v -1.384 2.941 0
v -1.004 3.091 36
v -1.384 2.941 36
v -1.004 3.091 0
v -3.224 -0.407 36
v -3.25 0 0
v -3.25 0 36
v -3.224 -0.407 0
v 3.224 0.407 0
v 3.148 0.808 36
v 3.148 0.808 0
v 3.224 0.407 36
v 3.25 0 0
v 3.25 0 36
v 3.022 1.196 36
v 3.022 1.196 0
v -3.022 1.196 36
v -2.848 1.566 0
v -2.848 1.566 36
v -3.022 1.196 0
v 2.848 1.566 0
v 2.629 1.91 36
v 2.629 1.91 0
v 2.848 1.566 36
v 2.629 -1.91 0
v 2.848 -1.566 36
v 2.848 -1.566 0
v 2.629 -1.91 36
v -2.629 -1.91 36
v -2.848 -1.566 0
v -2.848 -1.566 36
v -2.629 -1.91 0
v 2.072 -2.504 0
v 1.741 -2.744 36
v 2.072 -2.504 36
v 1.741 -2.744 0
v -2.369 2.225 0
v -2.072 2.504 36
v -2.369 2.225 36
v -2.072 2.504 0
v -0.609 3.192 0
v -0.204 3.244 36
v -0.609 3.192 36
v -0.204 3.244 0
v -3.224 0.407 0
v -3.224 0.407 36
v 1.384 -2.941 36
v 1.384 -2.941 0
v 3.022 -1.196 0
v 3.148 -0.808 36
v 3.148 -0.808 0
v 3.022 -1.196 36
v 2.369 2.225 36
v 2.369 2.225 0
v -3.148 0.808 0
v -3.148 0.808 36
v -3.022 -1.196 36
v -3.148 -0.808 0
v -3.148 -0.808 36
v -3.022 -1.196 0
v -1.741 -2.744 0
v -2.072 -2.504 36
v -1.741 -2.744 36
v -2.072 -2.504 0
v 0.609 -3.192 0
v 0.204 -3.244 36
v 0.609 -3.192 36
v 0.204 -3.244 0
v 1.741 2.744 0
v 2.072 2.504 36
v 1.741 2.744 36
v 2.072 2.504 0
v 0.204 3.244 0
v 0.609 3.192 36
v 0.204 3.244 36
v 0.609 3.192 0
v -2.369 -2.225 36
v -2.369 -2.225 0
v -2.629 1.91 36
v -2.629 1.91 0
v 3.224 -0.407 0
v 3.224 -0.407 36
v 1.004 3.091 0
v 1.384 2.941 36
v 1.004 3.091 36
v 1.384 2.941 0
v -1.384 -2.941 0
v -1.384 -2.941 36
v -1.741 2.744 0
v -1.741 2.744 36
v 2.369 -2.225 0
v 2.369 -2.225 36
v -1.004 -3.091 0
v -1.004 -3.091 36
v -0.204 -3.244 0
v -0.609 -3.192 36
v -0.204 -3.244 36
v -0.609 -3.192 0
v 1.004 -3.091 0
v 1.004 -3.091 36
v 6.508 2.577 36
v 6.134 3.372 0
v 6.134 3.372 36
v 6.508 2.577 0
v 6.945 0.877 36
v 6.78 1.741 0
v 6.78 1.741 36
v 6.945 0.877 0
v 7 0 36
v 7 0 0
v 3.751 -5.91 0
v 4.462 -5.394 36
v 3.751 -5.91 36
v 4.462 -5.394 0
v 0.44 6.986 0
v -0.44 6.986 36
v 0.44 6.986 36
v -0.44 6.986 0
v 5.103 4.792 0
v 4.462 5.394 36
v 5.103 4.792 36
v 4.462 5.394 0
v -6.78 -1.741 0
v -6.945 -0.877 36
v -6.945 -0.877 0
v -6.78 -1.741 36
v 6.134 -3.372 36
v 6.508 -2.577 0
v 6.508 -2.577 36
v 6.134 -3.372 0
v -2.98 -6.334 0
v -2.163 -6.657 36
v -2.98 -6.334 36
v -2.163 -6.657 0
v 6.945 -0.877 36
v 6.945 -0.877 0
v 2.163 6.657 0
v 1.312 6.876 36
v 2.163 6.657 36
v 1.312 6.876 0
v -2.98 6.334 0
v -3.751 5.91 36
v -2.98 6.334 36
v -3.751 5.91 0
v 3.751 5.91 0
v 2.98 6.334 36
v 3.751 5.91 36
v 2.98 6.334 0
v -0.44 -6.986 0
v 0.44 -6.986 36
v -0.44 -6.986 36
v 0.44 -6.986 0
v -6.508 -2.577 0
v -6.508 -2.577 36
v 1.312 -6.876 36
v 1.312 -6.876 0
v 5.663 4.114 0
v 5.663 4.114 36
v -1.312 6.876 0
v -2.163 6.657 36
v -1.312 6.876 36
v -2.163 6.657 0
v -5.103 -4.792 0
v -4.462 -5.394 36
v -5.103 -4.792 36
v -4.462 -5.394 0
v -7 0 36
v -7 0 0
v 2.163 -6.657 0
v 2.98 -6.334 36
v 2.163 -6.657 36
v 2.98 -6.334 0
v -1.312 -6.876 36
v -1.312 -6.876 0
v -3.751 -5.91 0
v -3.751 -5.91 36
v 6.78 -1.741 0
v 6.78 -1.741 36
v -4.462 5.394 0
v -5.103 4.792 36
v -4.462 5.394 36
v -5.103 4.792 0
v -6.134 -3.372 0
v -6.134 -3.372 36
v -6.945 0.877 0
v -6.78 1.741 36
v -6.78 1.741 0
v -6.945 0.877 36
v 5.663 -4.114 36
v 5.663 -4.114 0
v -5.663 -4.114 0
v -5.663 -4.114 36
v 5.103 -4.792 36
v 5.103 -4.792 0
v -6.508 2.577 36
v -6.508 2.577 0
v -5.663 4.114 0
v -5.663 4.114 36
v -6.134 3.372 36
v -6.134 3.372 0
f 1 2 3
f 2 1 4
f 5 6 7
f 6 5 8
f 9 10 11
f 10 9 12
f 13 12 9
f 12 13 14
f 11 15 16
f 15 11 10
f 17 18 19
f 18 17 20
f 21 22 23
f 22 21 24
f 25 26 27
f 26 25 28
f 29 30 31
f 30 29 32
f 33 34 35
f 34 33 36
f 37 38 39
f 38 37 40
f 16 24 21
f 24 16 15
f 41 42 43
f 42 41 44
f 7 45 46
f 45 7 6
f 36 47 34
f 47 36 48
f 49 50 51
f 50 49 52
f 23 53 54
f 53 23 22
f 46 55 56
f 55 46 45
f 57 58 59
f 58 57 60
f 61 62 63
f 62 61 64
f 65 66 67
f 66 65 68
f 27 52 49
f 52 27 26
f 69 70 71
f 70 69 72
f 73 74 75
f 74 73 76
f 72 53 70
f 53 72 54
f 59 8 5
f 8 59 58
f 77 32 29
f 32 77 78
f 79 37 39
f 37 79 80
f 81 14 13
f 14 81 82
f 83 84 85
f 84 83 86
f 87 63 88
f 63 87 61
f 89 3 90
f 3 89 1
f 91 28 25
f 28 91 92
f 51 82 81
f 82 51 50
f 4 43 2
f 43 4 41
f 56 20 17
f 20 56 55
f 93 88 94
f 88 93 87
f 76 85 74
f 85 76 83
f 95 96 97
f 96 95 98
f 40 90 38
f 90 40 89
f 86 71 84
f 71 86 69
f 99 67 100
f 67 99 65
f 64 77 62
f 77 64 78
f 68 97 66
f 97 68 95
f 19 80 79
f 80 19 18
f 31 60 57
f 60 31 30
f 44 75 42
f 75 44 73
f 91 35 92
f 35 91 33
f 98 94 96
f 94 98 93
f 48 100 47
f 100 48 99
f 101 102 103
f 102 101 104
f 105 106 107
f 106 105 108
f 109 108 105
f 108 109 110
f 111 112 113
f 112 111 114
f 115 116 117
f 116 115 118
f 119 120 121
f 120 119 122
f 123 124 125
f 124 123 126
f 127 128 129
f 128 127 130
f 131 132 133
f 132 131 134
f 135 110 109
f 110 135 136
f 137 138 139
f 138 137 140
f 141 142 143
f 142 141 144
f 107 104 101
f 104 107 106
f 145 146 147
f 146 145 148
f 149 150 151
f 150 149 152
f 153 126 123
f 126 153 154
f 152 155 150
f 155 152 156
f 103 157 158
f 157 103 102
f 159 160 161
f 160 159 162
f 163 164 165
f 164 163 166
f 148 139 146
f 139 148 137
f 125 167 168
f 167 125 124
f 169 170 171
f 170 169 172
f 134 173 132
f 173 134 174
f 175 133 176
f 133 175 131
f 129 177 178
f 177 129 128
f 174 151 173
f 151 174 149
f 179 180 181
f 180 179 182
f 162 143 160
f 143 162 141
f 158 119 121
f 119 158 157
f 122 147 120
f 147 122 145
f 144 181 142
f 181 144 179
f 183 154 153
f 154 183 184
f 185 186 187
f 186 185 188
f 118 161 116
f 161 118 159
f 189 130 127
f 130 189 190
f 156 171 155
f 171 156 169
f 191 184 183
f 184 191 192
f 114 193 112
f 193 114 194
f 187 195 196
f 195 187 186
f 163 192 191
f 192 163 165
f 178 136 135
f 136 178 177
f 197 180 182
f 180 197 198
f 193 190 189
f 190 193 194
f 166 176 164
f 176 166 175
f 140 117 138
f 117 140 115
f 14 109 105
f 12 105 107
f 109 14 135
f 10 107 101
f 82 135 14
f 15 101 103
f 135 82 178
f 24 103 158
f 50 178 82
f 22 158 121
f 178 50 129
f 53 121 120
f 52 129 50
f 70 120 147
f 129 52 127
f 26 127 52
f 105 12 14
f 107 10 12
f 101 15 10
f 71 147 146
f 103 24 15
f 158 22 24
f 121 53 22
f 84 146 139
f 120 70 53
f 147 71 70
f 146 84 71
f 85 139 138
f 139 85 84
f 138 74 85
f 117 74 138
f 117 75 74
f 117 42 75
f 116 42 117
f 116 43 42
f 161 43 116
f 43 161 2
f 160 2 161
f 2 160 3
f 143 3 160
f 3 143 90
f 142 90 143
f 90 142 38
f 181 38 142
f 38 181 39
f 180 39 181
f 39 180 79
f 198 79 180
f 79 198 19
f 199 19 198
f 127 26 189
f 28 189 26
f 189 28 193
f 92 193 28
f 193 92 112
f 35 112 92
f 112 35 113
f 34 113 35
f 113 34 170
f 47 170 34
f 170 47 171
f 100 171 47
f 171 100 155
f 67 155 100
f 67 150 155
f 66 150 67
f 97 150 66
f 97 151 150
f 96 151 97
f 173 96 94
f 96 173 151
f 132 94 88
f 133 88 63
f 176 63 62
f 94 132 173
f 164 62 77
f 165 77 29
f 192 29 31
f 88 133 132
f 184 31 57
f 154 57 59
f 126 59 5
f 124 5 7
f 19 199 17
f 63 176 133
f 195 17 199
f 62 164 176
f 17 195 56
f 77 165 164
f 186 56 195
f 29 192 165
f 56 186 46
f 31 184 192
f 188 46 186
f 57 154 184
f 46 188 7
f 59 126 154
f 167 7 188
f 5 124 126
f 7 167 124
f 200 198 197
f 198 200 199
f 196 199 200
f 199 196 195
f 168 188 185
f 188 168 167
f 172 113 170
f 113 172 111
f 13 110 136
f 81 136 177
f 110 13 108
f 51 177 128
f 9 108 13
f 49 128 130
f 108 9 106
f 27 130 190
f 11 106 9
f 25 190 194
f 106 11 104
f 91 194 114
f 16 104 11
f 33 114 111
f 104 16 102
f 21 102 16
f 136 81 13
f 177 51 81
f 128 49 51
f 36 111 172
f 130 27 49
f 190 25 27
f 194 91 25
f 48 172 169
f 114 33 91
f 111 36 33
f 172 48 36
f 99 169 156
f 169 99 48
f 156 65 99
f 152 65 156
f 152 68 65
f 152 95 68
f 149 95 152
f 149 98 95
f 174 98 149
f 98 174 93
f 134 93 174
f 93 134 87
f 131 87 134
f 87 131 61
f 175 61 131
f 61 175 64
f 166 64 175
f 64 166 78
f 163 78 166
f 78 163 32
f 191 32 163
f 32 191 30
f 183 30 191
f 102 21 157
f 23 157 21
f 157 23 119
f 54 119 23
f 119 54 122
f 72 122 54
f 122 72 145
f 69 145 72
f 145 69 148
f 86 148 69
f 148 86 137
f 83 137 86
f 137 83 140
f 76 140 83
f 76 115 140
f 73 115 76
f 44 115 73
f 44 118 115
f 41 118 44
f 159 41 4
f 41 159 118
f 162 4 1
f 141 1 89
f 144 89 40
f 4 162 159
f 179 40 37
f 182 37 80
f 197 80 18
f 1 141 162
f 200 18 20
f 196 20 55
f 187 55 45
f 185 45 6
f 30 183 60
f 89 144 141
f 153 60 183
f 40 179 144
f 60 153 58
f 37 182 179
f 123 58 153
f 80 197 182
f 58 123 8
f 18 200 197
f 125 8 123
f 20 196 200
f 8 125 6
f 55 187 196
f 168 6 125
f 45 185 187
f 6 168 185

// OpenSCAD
$fn = 50;


difference() {
	union() {
		cylinder(h = 36, r = 7.0000000000);
	}
	union() {
		translate(v = [0, 0, -100]) {
			cylinder(h = 200, r = 3.2500000000);
		}
		translate(v = [0, 0, -100]) {
			cylinder(h = 200, r = 1.8000000000);
		}
	}
}
